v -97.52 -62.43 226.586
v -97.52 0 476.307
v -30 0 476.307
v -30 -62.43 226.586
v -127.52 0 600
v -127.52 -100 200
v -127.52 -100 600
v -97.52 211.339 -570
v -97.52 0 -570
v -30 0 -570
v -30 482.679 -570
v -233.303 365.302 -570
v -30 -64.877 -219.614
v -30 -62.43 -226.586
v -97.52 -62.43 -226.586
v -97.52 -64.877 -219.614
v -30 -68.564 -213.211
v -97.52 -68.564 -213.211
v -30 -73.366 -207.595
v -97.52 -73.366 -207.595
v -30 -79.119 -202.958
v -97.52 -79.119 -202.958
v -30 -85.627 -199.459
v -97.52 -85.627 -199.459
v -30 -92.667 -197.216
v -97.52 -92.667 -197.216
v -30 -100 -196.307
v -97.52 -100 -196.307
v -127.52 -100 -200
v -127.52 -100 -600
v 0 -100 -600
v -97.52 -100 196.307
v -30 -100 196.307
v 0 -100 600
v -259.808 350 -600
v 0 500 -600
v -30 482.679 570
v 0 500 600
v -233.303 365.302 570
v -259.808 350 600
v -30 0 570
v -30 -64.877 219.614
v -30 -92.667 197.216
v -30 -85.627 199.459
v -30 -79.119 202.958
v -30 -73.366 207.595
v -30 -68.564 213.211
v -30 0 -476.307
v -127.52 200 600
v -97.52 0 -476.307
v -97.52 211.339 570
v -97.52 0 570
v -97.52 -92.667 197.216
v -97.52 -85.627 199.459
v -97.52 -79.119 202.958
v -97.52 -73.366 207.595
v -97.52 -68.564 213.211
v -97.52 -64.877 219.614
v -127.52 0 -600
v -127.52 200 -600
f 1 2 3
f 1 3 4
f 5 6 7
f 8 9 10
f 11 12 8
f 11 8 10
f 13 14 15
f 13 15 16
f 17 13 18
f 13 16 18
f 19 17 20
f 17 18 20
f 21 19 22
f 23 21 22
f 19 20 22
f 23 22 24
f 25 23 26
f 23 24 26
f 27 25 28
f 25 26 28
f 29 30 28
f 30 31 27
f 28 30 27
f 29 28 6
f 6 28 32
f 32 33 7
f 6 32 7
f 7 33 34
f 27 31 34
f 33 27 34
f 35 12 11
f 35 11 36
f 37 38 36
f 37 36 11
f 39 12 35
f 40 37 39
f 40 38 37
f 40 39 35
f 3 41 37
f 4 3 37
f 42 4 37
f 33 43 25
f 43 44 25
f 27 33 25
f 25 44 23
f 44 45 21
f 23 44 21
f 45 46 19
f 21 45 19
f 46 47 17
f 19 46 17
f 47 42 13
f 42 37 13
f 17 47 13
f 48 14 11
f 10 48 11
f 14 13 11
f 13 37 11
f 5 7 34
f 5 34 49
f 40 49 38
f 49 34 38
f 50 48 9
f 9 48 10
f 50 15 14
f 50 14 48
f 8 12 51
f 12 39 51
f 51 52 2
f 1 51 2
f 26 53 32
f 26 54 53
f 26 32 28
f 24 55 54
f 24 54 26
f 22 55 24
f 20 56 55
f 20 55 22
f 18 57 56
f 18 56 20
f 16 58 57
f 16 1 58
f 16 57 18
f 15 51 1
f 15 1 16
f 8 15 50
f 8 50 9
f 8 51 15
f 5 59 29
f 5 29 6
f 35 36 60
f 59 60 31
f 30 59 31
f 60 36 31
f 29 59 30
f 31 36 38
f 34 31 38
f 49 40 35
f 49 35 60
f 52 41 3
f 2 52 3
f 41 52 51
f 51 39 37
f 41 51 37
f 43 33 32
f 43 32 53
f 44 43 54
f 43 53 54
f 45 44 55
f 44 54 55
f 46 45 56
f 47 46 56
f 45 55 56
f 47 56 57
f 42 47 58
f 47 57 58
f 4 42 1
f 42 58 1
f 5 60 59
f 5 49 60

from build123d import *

# Parameters (mm, degrees)
BOSS_EXTRUDE1_DEPTH = 600
SHELL1_T            = -30
SKETCH3_W           = 67.520055582
SKETCH3_H           = 1140
CUT_EXTRUDE1_DEPTH  = 806.232885568
BOSS_EXTRUDE2_DEPTH = 127.52006
SHELL2_START        = -97.520055582
SHELL2_DEPTH        = 67.520055582
SKETCH5_W           = 67.520055582
SKETCH5_H           = 392.613662462
CUT_EXTRUDE2_DEPTH  = 868.409937688
BOSS_EXTRUDE3_DEPTH = 127.520055582
FILLET1_R           = 40


# Read off the part's stored shape, not the designer's step: Shell2
with BuildPart() as part:
    # Sketch2 → Boss-Extrude1 (new, symmetric)
    with BuildSketch(Plane.XY):
        Polygon((0, 0), (0, 500), (-259.807621135, 350), (-127.520055582, 200), (-127.520055582, 0), align=None)
    extrude(amount=BOSS_EXTRUDE1_DEPTH, both=True)

    # Shell1
    shell1_openings = [part.faces().sort_by_distance(p)[0] for p in [
        (-129.903810568, 425, 0),
    ]]
    offset(amount=SHELL1_T, openings=shell1_openings, kind=Kind.INTERSECTION)

    # Sketch3 → Cut-Extrude1 (cut, through all)
    with BuildSketch(Plane(origin=(0, 30, 0), x_dir=(1, 0, 0), z_dir=(0, 1, 0))):
        with Locations((-63.760027791, 0)):
            Rectangle(SKETCH3_W, SKETCH3_H)
    extrude(amount=-CUT_EXTRUDE1_DEPTH, mode=Mode.SUBTRACT)

    # Sketch4 → Boss-Extrude2 (add)
    with BuildSketch(Plane(origin=(0, 0, 0), x_dir=(0, 0, -1), z_dir=(1, 0, 0))):
        Polygon((-600, 0), (600, 0), (200, -100), (-200, -100), align=None)
    extrude(amount=-BOSS_EXTRUDE2_DEPTH)

    # Shell2 outline → Shell2 (cut)
    with BuildSketch(Plane.YZ.offset(SHELL2_START)):
        Polygon((0, -476.306831231), (0, 476.306831231), (-70, 196.306831231), (-70, -196.306831231), align=None)
    extrude(amount=SHELL2_DEPTH, mode=Mode.SUBTRACT)

    # Sketch5 → Cut-Extrude2 (cut, through all)
    with BuildSketch(Plane(origin=(0, -70, 0), x_dir=(1, 0, 0), z_dir=(0, 1, 0))):
        with Locations((-63.760027791, 0)):
            Rectangle(SKETCH5_W, SKETCH5_H)
    extrude(amount=-CUT_EXTRUDE2_DEPTH, mode=Mode.SUBTRACT)

    # Sketch6 → Boss-Extrude3 (add)
    with BuildSketch(Plane(origin=(0, 0, -600), x_dir=(0, 0, -1), z_dir=(1, 0, 0))):
        Polygon((-1200, 0), (-800, -100), (-1200, -100), align=None)
        Polygon((-400, -100), (0, 0), (0, -100), align=None)
    extrude(amount=-BOSS_EXTRUDE3_DEPTH)

    # Fillet1
    # the kernel refuses this fillet: 40 mm, written as the material it takes off along each edge
    with BuildSketch(Plane(origin=(-97.520055582, -70, 196.306831231), x_dir=(0, 0.24253562503633297, 0.9701425001453319), z_dir=(1, 0, 0))) as fillet1_piece_1:
        with BuildLine():
            CenterArc((31.211373056, 40), FILLET1_R, 195.806721483, 74.193278517)
            Line((-7.276068751, 29.104275004), (0, 0))
            Line((0, 0), (31.211373056, 0))
        make_face()
    extrude(amount=67.520055582, mode=Mode.SUBTRACT)
    with BuildSketch(Plane(origin=(-97.520055582, -70, -196.306831231), x_dir=(0, 0.24253562503633297, -0.9701425001453319), z_dir=(1, 0, 0))) as fillet1_piece_2:
        with BuildLine():
            CenterArc((31.211373056, -40), FILLET1_R, 90, 74.193278517)
            Line((-7.276068751, -29.104275004), (0, 0))
            Line((0, 0), (31.211373056, 0))
        make_face()
    extrude(amount=67.520055582, mode=Mode.SUBTRACT)


solid = part.part
